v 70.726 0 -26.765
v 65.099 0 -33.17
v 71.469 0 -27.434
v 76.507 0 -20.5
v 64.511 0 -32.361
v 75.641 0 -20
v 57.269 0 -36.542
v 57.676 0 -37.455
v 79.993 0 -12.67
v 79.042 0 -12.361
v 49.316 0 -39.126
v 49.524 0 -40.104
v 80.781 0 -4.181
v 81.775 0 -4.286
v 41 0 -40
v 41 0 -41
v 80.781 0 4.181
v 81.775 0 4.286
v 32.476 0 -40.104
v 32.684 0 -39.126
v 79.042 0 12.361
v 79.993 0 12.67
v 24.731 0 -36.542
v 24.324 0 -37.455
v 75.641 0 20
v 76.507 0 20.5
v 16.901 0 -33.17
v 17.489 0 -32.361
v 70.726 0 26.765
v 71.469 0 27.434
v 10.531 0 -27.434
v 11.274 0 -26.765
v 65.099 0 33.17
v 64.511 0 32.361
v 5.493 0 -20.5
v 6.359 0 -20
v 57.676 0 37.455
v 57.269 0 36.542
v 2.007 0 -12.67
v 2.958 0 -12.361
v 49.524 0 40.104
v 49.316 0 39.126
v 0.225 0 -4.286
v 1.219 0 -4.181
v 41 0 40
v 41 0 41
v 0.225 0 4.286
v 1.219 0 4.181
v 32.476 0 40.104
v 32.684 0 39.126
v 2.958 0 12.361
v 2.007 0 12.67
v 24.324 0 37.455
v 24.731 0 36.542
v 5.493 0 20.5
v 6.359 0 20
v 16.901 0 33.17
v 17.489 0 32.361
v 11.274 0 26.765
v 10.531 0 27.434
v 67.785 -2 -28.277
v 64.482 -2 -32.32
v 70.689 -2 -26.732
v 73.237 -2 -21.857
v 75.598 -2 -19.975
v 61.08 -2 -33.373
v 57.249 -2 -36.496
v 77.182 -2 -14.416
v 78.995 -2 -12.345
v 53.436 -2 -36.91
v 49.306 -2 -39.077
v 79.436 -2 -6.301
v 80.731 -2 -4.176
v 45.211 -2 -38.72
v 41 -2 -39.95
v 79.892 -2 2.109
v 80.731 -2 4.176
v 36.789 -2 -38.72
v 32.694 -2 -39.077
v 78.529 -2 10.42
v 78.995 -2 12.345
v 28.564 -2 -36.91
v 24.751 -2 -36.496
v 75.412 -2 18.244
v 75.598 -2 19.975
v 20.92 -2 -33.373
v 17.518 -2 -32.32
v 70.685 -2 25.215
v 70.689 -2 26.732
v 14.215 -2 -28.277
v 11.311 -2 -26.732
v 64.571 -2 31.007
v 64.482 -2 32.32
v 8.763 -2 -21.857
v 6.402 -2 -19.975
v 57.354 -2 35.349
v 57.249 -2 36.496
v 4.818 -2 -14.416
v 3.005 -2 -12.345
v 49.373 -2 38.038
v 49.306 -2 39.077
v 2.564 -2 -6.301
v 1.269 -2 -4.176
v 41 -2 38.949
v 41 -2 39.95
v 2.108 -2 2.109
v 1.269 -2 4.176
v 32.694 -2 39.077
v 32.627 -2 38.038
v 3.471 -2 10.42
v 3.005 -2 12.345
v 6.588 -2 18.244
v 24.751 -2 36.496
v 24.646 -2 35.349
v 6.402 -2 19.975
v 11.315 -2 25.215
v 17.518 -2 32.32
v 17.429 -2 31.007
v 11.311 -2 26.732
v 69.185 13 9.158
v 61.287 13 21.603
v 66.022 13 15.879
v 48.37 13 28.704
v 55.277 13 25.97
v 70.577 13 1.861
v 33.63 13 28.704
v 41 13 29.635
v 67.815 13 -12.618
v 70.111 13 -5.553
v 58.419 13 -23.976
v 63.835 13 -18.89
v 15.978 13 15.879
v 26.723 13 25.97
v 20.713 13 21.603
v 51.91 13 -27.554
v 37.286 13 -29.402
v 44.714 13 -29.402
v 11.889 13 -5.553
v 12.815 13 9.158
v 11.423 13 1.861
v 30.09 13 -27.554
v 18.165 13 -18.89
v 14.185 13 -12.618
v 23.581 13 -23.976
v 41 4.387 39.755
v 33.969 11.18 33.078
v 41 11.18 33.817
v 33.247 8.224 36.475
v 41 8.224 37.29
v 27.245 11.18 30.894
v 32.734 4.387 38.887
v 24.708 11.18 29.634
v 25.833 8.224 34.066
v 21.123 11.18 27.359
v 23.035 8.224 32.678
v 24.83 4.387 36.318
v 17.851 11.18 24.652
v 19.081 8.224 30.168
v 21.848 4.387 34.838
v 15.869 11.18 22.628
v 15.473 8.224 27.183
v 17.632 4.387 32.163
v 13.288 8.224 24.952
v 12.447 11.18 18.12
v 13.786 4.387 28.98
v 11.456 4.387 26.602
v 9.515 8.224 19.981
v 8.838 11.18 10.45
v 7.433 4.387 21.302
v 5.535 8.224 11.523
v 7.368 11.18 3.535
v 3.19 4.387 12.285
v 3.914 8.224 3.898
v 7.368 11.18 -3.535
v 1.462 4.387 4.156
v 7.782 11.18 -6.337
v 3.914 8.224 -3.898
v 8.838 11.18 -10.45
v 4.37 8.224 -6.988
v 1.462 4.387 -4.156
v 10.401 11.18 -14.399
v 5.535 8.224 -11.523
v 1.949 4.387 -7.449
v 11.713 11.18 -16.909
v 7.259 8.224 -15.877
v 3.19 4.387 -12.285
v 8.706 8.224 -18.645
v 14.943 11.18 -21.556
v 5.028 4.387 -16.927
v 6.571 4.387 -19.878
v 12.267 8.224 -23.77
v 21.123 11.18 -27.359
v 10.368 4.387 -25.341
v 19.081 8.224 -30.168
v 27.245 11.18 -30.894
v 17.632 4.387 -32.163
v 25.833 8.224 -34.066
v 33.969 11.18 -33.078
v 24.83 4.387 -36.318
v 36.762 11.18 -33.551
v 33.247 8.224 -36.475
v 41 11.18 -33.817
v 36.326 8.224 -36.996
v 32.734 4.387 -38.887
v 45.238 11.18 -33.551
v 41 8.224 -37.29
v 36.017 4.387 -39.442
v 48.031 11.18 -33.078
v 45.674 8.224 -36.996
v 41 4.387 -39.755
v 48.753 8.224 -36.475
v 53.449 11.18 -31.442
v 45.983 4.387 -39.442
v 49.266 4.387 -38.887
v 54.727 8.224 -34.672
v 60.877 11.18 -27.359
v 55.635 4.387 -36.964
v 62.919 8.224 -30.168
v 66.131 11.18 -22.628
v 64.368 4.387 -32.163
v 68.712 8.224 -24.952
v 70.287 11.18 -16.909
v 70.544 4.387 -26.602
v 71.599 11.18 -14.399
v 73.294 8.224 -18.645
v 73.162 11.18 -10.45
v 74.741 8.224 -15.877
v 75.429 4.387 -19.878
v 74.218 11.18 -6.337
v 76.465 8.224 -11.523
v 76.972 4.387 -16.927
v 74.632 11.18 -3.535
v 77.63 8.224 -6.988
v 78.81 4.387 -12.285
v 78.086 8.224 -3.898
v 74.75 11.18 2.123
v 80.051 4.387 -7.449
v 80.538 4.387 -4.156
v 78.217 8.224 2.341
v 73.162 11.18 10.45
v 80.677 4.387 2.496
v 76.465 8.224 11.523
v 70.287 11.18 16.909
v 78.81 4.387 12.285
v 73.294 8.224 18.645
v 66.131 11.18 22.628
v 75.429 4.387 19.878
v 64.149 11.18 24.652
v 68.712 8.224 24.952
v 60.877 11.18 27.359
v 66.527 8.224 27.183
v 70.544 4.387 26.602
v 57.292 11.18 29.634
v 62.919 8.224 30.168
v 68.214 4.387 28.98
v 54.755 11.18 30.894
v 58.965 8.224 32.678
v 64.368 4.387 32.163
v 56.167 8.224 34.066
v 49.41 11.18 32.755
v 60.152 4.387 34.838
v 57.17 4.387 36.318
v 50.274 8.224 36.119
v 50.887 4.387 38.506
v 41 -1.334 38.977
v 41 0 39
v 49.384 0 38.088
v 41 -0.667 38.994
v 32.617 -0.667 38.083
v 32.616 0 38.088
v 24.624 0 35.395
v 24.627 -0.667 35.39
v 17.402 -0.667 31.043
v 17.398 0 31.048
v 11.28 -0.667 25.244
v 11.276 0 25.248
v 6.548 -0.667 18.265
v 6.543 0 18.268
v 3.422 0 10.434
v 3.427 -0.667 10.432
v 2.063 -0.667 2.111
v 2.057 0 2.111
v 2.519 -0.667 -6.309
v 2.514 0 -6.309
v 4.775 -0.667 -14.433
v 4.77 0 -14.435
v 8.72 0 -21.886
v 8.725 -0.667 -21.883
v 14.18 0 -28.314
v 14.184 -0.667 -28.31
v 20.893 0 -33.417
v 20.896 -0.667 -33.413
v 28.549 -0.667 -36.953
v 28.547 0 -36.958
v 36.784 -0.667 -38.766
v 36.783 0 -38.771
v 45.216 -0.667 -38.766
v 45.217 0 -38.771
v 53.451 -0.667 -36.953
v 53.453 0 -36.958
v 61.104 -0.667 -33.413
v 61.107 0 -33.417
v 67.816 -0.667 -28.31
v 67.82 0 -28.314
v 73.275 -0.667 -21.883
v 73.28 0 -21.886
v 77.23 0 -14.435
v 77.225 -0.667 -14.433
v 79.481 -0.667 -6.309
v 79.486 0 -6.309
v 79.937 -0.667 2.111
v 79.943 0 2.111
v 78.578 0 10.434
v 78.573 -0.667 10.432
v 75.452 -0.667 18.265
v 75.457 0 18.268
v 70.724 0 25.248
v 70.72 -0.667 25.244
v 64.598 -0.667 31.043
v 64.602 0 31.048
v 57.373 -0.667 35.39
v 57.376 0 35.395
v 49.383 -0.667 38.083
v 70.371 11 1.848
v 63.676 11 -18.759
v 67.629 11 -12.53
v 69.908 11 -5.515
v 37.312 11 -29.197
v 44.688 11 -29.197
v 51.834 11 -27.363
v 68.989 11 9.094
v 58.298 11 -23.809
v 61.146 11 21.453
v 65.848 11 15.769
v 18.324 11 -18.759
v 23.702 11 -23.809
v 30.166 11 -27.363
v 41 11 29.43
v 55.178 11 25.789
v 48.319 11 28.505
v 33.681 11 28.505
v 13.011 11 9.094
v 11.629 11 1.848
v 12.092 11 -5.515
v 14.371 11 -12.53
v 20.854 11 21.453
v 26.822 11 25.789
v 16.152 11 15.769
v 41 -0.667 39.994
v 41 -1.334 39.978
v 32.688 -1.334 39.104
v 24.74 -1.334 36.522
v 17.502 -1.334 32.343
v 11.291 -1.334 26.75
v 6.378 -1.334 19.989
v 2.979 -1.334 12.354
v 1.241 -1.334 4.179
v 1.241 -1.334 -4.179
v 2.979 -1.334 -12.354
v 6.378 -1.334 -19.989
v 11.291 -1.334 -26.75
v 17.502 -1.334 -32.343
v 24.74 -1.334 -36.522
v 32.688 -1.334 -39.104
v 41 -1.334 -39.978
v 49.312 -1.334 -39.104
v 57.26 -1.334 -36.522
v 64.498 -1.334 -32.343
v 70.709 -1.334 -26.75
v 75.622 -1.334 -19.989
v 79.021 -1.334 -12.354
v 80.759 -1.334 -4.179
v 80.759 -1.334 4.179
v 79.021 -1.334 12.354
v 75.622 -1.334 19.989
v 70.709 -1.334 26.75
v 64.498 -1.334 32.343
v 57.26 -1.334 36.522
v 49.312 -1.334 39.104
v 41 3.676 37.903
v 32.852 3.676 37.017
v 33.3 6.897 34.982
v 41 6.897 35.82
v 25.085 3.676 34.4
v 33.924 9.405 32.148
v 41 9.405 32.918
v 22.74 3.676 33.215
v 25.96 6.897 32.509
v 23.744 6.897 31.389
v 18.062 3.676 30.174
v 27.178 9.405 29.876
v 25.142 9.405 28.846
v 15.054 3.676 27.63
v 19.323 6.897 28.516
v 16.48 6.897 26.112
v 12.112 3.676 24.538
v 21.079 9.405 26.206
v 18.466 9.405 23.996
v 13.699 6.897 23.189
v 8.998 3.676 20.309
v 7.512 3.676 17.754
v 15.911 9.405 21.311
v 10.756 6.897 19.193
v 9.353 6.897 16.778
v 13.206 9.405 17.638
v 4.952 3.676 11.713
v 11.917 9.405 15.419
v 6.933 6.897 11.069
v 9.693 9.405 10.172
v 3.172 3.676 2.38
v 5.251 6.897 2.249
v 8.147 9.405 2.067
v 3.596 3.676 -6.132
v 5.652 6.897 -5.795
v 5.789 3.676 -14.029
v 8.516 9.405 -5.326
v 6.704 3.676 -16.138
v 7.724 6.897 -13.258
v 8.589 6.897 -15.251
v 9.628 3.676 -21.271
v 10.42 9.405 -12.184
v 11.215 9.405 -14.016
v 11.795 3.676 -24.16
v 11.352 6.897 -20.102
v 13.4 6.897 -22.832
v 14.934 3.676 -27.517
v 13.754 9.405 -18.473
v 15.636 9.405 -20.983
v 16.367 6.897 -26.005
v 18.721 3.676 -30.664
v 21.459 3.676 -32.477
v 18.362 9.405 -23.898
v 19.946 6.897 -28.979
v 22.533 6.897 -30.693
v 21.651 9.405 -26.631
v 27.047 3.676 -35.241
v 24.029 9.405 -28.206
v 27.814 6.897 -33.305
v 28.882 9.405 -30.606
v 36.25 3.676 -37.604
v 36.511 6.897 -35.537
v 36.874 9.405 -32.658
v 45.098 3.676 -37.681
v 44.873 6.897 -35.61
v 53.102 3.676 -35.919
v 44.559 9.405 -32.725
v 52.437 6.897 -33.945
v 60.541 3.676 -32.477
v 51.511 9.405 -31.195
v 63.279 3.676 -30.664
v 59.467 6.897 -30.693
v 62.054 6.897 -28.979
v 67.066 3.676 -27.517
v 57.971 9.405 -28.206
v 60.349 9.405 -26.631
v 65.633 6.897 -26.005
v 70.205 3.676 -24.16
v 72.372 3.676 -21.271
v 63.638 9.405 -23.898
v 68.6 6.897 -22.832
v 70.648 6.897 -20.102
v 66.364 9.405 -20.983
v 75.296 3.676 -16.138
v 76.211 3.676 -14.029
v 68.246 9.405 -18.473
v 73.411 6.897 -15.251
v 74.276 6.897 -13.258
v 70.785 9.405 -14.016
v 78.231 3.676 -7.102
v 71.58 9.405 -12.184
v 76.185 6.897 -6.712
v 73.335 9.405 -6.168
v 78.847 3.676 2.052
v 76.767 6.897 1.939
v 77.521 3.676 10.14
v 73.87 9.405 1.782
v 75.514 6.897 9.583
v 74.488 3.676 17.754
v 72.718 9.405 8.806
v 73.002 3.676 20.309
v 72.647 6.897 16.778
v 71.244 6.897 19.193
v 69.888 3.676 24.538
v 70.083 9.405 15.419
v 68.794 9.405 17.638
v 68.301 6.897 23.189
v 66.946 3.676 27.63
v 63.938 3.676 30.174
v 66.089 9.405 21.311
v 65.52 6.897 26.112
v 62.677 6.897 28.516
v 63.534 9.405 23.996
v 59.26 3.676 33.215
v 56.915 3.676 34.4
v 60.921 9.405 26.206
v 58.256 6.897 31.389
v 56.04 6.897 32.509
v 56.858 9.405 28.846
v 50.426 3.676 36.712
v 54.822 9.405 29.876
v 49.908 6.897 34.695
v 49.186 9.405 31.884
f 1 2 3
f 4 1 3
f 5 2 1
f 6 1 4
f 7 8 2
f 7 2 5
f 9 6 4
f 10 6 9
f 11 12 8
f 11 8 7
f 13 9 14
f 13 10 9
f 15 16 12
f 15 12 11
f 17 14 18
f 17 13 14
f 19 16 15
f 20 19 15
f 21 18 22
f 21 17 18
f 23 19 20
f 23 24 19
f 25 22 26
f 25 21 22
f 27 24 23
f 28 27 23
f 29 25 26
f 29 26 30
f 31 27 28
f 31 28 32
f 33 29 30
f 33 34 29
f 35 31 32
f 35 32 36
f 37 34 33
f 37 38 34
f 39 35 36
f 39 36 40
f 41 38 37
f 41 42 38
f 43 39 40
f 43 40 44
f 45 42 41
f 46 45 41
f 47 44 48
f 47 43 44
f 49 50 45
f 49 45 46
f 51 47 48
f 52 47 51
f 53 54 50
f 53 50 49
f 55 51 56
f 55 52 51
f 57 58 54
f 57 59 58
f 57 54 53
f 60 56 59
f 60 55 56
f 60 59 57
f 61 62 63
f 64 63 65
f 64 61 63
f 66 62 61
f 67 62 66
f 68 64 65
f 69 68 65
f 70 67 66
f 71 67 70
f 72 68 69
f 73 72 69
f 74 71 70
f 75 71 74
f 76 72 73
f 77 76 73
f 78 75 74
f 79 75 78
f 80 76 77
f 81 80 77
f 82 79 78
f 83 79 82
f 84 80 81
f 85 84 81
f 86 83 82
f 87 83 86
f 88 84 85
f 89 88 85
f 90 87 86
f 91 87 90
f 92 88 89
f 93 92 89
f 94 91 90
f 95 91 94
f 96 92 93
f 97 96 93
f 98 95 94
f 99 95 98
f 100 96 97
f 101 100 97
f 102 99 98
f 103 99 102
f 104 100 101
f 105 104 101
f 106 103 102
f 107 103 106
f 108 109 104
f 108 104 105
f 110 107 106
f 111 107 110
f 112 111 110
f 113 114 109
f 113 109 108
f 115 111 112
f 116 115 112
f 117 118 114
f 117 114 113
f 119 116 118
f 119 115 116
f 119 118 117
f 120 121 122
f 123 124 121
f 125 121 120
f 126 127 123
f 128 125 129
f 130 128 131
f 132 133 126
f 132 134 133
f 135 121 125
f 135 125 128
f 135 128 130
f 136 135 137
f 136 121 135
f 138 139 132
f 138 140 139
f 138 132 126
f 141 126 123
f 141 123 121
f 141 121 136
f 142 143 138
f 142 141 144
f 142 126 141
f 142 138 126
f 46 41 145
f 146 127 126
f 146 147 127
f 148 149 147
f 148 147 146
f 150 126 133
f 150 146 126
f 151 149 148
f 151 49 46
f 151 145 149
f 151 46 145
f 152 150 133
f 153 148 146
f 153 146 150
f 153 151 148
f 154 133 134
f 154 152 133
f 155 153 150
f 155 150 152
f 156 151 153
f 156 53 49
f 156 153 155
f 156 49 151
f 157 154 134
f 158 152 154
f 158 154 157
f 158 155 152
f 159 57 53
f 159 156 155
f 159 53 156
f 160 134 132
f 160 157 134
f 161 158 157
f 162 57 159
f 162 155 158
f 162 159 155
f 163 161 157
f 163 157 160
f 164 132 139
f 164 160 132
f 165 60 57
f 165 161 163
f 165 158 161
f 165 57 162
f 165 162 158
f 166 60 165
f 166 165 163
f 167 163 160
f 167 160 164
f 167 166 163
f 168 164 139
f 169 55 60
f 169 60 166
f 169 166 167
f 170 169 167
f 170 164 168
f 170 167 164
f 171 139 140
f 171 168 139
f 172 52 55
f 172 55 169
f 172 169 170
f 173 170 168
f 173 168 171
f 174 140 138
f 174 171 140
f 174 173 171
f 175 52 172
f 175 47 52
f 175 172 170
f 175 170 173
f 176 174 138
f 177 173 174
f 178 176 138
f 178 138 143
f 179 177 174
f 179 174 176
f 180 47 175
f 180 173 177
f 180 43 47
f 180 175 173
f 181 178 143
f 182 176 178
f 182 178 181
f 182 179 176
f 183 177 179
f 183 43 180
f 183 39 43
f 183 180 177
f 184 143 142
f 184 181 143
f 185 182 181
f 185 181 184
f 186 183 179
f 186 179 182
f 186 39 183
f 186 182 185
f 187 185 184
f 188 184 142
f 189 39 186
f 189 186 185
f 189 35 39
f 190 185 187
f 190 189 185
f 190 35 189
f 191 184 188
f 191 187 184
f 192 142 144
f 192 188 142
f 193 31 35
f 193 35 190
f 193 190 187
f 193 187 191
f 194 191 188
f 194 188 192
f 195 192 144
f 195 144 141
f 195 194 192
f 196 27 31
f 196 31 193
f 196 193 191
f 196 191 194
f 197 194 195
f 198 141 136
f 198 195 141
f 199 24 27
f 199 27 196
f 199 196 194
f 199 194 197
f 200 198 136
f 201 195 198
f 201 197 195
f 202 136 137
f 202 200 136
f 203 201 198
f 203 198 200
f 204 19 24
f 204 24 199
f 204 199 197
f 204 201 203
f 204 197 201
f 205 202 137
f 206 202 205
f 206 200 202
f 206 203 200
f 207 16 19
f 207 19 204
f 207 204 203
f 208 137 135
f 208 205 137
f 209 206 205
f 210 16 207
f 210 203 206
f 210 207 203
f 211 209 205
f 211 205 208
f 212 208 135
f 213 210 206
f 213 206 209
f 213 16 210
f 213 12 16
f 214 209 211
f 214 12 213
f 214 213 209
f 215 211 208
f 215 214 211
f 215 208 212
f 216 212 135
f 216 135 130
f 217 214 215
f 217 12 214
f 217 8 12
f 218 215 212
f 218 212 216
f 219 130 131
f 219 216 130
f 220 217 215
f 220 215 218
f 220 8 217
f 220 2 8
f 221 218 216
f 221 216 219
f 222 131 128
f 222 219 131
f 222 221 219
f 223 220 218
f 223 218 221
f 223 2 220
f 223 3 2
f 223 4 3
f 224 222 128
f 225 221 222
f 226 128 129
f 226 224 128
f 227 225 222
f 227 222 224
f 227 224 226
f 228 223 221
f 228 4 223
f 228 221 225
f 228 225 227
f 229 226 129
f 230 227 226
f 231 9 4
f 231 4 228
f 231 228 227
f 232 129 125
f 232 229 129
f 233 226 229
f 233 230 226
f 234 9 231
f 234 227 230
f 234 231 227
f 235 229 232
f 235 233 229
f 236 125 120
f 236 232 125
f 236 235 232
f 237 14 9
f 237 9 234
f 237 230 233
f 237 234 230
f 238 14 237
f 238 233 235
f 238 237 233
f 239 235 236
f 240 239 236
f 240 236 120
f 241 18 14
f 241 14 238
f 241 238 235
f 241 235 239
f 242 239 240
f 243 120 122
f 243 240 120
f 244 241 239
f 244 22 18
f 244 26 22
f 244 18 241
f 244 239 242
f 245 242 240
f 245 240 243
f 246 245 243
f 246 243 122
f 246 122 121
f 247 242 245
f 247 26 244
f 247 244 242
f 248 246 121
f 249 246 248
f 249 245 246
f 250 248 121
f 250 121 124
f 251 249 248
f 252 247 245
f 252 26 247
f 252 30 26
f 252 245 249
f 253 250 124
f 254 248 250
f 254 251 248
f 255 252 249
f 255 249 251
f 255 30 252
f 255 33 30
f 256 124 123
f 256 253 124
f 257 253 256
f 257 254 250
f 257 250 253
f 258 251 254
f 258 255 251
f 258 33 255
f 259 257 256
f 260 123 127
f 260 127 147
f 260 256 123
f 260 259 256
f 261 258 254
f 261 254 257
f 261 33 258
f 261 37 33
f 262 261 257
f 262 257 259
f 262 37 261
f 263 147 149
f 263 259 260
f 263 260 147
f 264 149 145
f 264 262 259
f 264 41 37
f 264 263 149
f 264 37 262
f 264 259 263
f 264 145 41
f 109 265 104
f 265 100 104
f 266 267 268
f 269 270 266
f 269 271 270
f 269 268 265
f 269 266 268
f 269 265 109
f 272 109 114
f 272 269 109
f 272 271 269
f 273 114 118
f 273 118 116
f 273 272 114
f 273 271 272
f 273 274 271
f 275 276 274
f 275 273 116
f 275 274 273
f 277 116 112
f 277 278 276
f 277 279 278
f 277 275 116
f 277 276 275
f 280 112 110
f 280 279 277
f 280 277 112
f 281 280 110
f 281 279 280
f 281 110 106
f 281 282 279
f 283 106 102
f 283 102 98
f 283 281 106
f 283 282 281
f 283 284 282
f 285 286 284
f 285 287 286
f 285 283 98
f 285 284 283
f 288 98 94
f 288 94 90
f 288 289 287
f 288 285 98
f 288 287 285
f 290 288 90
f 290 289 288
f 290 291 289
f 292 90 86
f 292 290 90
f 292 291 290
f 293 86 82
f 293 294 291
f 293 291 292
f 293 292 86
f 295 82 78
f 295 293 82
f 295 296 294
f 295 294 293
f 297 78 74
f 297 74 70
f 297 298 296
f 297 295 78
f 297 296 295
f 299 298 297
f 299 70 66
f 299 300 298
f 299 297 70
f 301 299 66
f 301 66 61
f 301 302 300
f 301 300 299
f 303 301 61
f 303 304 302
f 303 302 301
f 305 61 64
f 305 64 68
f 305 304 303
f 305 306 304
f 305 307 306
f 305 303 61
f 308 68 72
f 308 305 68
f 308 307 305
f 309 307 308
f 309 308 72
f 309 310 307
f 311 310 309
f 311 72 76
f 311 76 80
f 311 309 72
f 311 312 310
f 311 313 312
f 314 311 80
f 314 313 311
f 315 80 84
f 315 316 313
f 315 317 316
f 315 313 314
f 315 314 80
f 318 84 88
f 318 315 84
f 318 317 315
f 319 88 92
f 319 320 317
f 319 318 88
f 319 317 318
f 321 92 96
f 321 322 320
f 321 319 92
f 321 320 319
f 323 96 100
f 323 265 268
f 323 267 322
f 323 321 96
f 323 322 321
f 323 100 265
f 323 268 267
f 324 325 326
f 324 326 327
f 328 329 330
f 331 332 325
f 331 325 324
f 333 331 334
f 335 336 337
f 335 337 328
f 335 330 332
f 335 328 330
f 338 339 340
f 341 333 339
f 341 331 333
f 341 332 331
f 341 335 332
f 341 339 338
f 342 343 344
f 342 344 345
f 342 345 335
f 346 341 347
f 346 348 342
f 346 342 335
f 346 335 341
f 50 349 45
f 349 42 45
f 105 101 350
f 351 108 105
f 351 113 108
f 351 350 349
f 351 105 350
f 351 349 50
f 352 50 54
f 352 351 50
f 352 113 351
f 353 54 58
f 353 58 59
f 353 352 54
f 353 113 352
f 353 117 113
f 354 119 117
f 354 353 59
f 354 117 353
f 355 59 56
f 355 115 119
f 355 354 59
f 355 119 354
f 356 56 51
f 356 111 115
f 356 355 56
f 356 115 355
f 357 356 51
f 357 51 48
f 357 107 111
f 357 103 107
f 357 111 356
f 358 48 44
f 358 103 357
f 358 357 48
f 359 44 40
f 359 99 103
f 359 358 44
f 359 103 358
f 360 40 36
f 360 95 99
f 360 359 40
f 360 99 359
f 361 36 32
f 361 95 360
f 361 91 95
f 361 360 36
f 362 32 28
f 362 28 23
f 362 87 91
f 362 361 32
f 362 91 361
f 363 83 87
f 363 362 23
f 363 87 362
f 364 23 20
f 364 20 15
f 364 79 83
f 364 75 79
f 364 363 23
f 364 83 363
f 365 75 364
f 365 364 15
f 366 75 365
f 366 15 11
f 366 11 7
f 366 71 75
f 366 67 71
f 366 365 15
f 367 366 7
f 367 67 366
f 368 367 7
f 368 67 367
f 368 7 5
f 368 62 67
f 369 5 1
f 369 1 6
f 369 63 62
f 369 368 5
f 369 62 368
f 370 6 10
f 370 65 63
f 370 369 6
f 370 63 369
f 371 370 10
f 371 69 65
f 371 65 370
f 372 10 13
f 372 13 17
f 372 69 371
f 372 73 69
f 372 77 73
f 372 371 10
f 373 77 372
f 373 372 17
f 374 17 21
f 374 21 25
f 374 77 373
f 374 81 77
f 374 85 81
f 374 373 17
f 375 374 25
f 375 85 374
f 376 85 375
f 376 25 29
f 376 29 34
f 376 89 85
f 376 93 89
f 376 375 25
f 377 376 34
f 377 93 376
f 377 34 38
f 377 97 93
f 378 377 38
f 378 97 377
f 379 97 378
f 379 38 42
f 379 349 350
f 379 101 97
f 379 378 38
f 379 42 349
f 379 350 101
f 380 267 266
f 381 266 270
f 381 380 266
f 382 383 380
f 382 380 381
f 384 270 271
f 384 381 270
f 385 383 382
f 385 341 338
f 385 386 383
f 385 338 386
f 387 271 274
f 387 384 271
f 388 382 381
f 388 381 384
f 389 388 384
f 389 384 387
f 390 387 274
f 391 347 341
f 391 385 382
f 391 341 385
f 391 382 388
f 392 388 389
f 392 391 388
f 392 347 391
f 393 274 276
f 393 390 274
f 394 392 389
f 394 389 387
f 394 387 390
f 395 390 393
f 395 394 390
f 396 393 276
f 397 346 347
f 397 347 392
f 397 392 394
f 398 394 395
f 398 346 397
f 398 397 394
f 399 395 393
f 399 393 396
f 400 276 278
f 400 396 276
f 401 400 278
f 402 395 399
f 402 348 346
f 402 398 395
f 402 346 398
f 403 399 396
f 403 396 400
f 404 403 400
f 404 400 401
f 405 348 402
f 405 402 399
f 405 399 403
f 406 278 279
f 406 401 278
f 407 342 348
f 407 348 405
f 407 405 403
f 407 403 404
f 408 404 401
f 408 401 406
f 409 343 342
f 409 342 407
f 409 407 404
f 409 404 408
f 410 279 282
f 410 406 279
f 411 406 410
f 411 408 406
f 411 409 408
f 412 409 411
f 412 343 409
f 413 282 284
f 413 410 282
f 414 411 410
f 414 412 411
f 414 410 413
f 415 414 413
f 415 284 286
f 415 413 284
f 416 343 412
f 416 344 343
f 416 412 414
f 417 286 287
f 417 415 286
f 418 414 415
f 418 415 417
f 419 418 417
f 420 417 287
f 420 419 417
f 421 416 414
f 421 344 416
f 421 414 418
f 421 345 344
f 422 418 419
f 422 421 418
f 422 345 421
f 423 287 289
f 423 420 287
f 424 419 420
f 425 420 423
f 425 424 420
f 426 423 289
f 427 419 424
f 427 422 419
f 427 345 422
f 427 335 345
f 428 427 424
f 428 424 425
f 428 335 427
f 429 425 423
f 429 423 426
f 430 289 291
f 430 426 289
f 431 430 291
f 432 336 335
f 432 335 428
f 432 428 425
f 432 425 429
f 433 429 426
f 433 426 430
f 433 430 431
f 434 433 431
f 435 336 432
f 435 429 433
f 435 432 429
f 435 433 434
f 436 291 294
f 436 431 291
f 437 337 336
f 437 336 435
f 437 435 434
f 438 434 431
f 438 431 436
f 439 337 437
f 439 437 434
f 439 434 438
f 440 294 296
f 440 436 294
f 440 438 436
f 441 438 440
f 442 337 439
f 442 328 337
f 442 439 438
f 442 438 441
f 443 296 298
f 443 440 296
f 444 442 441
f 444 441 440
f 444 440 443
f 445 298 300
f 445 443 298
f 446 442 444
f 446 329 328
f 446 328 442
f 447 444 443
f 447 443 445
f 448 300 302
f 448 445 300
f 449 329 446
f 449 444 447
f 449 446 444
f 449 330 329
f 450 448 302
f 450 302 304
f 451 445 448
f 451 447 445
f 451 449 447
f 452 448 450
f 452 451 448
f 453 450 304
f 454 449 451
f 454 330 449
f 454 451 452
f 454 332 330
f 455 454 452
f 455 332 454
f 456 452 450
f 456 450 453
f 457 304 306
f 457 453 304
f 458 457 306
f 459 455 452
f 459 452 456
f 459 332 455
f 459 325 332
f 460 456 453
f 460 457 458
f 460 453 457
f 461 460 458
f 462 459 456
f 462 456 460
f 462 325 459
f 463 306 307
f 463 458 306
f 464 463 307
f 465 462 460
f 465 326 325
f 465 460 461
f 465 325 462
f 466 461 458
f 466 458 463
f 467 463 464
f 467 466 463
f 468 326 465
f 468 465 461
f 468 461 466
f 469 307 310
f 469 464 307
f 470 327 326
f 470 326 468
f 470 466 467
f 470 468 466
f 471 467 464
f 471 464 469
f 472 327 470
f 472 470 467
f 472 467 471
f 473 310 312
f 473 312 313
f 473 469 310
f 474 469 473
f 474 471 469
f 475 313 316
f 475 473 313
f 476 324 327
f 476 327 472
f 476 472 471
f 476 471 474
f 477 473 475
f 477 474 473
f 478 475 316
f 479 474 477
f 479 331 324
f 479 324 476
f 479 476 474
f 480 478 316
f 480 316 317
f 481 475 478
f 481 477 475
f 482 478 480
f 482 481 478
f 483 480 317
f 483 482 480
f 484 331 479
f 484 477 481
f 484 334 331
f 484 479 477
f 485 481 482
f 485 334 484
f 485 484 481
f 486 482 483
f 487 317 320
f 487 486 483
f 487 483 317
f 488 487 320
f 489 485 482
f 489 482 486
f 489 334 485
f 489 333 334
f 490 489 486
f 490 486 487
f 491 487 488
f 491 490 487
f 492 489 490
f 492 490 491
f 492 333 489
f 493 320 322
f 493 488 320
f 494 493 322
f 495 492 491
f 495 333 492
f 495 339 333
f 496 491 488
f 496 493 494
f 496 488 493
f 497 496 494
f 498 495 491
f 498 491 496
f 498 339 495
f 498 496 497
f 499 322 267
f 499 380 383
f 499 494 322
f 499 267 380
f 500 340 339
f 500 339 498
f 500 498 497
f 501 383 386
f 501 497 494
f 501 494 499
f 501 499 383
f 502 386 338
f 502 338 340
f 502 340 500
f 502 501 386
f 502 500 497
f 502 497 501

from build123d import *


with BuildPart() as part:
    # Sketch1 → Revolve3 (revolve)
    with BuildSketch(Plane.XY, mode=Mode.PRIVATE) as revolve3_sk:
        with BuildLine():
            Line((0, 0), (1, 0))
            ThreePointArc((1, 0), (1.012509778, -1.000312842), (1.050031289, -2))
            Line((1.050031289, -2), (2.051315812, -2))
            ThreePointArc((2.051315812, -2), (2.012831064, -1.00032911), (2, 0))
            ThreePointArc((2, 0), (5.180088034, 6.896539681), (11.570458359, 11))
            Line((11.570458359, 11), (41, 11))
            Line((41, 11), (41, 13))
            Line((41, 13), (11.364514255, 13))
            ThreePointArc((11.364514255, 13), (3.709713219, 8.224384875), (0, 0))
        make_face()
    revolve(revolve3_sk.sketch.rotate(Axis((41, 13, 0), (0, -1, 0)), 270), axis=Axis((41, 13, 0), (0, -1, 0)))


solid = part.part
